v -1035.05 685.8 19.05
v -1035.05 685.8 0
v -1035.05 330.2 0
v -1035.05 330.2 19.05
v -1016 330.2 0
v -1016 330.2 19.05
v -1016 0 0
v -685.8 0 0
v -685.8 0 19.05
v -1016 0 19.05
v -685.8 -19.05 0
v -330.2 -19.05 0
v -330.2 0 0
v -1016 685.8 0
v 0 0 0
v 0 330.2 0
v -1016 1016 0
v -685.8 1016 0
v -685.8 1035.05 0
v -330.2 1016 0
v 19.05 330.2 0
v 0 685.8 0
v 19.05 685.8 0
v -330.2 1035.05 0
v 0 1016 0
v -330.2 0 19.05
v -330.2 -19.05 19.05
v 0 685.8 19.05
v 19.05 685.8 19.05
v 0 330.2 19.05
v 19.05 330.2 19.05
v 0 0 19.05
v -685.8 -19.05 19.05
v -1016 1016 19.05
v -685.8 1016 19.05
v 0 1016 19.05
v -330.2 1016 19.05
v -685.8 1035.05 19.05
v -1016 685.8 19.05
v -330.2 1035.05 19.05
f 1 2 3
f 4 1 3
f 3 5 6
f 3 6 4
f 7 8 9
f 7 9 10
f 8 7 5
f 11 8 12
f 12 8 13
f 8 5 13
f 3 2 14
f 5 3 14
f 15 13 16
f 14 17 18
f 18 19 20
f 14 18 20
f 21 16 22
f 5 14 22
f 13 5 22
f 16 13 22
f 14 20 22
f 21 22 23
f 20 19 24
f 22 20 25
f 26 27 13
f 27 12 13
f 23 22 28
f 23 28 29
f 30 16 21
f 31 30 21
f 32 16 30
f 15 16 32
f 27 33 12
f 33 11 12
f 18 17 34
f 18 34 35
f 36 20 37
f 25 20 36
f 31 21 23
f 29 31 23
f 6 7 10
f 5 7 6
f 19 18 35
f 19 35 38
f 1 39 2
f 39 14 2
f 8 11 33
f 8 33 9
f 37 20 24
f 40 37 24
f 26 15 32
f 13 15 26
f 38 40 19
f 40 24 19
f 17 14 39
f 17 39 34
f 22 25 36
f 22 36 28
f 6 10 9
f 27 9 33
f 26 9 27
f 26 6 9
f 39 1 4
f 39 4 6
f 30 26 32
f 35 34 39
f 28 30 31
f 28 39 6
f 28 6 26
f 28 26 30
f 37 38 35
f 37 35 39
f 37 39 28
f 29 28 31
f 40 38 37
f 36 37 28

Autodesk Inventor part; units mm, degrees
ref_plane "YZ Plane" through (0, 0, 0) normal (1, 0, 0) x (0, 1, 0)
ref_plane "XZ Plane" through (0, 0, 0) normal (0, 1, 0) x (-1, 0, 0)
ref_plane "XY Plane" through (0, 0, 0) normal (0, 0, 1) x (1, 0, 0)
sketch "Sketch1" plane through (0, 0, 0) normal (0, 0, 1) x (1, 0, 0)
  line L0 (0, 0) -> (-1016, 0)
  line L1 (-1016, 0) -> (-1016, 1016)
  line L2 (-1016, 1016) -> (0, 1016)
  line L3 (0, 1016) -> (0, 0)
  line L4 (19.05, 1035.05) -> (-1035.05, 1035.05)
  line L5 (-1035.05, 1035.05) -> (-1035.05, -19.05)
  line L6 (-1035.05, -19.05) -> (19.05, -19.05)
  line L7 (19.05, -19.05) -> (19.05, 1035.05)
  line L8 (-685.8, 1016) -> (-685.8, 1035.05)
  line L9 (-330.2, 1016) -> (-330.2, 1035.05)
  line L10 (-685.8, -19.05) -> (-685.8, 0)
  line L11 (-330.2, -19.05) -> (-330.2, 0)
  line L12 (0, 330.2) -> (19.05, 330.2)
  line L13 (0, 685.8) -> (19.05, 685.8)
  line L14 (-1016, 685.8) -> (-1035.05, 685.8)
  line L15 (-1016, 330.2) -> (-1035.05, 330.2)
  point P0 (-1644.65, 1016)
  point P1 (-1644.65, 1035.05)
  point P2 (-387.35, 1016)
  point P3 (-387.35, 1035.05)
  point P4 (-685.8, -19.05)
  point P5 (-685.8, 0)
  point P6 (-330.2, 0)
  point P7 (-330.2, -19.05)
  dimension "d0" = 1016
  dimension "d1" = 1016
  dimension "d2" = 19.05
  dimension "d5" = 355.6
  dimension "d7" = 355.6
  dimension "d10" = 349.25
  dimension "d11" = 349.25
  dimension "d12" = 355.6
  dimension "d13" = 349.25
  dimension "d14" = 349.25
  dimension "d15" = 349.25
  dimension "d18" = 349.25
extrude "Extrusion1" add sketch "Sketch1" along normal blind 19.05 contours L0 L1 L2 L3 | L11 L6 L10 L0 | L3 L13 L7 L12 | L15 L5 L14 L1 | L2 L8 L4 L9
properties part number "Final Product backplate"
